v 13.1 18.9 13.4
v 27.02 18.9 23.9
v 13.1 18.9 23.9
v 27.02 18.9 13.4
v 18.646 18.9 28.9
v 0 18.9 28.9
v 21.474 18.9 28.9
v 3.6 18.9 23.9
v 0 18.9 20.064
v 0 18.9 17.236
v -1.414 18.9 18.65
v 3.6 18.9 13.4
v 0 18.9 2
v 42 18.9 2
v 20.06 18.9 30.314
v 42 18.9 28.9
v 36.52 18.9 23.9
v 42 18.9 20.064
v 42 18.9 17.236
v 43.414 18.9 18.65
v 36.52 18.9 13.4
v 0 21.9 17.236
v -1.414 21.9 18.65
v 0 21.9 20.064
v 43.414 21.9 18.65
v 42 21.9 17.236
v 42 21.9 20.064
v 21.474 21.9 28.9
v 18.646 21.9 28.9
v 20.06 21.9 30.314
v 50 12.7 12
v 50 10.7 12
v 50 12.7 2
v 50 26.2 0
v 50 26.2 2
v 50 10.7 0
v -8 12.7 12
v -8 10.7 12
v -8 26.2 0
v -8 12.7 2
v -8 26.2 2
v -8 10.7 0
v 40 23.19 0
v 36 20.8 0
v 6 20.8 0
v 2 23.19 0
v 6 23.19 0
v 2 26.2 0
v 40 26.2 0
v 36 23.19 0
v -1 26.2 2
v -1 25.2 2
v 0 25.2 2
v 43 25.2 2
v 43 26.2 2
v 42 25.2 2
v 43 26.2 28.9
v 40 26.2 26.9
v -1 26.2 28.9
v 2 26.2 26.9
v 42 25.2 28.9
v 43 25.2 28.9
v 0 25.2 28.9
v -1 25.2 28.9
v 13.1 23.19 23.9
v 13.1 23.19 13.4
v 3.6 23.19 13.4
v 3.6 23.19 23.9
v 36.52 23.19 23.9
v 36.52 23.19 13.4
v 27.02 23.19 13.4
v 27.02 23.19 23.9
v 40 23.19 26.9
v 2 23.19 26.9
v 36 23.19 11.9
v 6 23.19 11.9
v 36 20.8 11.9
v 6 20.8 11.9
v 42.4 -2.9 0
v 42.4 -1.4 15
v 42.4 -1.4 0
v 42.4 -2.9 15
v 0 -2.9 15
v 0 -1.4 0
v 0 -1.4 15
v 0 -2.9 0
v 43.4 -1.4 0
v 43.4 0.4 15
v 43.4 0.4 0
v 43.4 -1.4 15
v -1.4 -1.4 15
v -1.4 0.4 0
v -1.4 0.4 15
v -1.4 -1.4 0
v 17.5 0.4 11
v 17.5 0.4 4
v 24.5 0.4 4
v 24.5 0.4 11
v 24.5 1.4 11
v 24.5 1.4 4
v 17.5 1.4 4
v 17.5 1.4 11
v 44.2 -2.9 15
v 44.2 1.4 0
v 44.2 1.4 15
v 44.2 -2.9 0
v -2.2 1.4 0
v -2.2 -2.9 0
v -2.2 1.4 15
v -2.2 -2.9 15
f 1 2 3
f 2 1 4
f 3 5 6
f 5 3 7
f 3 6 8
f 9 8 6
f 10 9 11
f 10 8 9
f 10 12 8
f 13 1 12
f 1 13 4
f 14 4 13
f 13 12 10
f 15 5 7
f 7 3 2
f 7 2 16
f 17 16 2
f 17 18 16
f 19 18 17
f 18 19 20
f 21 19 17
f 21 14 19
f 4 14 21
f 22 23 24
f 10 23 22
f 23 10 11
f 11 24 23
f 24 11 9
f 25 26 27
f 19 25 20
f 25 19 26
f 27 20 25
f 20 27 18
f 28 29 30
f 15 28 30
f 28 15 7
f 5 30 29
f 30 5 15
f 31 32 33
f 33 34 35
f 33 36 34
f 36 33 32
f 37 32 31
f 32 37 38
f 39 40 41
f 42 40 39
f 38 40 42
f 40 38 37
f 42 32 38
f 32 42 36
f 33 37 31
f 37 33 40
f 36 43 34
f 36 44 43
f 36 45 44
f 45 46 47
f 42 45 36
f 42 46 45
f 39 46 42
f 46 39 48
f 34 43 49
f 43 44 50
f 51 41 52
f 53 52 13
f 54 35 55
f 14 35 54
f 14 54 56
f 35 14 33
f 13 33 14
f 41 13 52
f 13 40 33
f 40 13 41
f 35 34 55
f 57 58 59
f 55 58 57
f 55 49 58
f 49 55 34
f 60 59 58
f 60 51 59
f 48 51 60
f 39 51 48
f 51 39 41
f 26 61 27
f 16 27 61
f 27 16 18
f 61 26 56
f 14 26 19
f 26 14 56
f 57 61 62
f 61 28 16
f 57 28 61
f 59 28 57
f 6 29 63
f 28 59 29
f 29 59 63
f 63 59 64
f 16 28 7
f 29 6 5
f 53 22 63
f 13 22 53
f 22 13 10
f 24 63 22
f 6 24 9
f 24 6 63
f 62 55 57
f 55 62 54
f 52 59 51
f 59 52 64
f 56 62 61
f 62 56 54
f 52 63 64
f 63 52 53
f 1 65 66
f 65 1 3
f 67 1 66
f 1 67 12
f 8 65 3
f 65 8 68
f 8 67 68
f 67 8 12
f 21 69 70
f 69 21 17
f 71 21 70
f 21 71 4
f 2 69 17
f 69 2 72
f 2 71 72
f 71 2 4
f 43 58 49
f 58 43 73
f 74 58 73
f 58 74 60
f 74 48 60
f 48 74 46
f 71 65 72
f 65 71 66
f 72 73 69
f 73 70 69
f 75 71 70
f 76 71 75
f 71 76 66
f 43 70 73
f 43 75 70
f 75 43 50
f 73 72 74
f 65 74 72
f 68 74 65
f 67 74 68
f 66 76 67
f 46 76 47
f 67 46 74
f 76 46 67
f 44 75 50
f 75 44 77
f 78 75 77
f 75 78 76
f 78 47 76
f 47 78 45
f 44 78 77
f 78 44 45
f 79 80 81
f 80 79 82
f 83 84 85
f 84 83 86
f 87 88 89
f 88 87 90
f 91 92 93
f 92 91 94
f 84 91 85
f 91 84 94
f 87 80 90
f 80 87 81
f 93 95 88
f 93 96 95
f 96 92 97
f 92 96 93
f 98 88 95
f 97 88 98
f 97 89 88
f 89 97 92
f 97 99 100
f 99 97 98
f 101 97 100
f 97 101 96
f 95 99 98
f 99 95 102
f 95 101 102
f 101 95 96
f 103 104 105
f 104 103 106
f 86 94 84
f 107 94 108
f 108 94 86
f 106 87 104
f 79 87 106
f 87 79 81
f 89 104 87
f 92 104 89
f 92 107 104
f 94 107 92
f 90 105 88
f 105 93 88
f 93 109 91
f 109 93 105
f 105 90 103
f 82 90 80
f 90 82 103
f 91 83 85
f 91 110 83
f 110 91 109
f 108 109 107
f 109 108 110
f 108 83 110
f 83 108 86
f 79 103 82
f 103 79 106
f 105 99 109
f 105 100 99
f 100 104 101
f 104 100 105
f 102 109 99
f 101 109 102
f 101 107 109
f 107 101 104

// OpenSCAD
/*
* Open3DOLED is licensed under CC BY-NC-SA 4.0. To view a copy of this license, visit http://creativecommons.org/licenses/by-nc-sa/4.0/
*/

/*
*
* 3D IR Emitter Mount
*
* Version 0101a: first attempt
* Version 0102a: lots of changes
* Version 0103a: added optional spacer for ir cut filter 10x10x0.55mm https://www.aliexpress.com/item/1005002502760553.html
* Version 0104a: revised ir cut filter to be on inside with no adhesive and minimal black backing
* Version 0105a: added alignment markers for calibration assistance mode
* 
* Todo:
*  - 
* 
* Notes:
*  - 
*
*/

ovr = 0.01;

// Screen bezel to pixel height dimension
// 11 mm - LG C1 OLED and Sony XBR-48A9S Bezel Only
// 14 mm - LG C1 OLED and MMK 55MBL-EL Screen protector
// 7 mm - LG G3 OLED Bezel Only
// 9 mm - Sony X95K MiniLED
tv_top_bezel_to_pixel_wz = 11;

// Screen bezel thickness dimensions 
// 4.7 mm - LG C1 OLED Bezel Only (measured 4.4 mm)
// 6.2 mm - LG C1 OLED with felt (back and front)
// 29 mm - LG C1 OLED and MMK 55MBL-EL Screen protector
// 30 mm - LG C1 OLED and MMK 55MBL-EL Screen protector with felt
// 5.5 mm - Sony XBR-48A9S Bezel Only
// 13.5 mm - LG G3 OLED Bezel Only
// 15.0 mm - LG G3 OLED Bezel Only with felt (back and front)
// 32 mm - Sony X95K MiniLED (it has a rounded back so I've made it a little larger than what looks like 30mm any extra can be filled with spacers)
mm_r_wy = 6.2;

// Mount Ridge Ledge Height
// 10 mm - Most sets with a flat back that goes down > 10 mm from the top
// 20 mm - Sony X95K MiniLED (has a curved back for the first 10 mm)
mm_rl_wz = 10;

tv_top_wz = tv_top_bezel_to_pixel_wz+4.5; // we add 4.5 mm for optional faded board to help prevent potential burn-in

pcb_wx = 38; // measured 37.63
pcb_wz = 60; // measured 59.03
pcb_wy = 1.4;
pcb_wy_pkt = 3; // deep enough to hold the pcb board firmly but not soo deep as to hit the connector pins measured 3.4 with solder stubs sticking out
pcb_wb = 2; // plastic board thickness surrounding pcb
// pocket for solder stubs
pcb_p_px = 4;
pcb_p_wx = pcb_wx - 2*pcb_p_px;
pcb_p_wy = 2.4; // measured 4.0 minus 1.6 pcb depth
pcb_p_wz = 13; // height of pocket
pcb_p_sz = 1.5; // space between pocket and opt-101 top
// plastic back behind pcb that sticks above to screw into
pcb_b = false;
pcb_b_wy = 4; 
pcb_b_wz = pcb_wz + 2 * pcb_wb;
// plastic ridges on side to clip brace bracket onto
pcb_r = true;
pcb_r_wy = 1;
pcb_r_wx = 1;


// opt sensor (chip)
os_s_wx = 22.86; // measured 22.86 on pcbnew opt-101 center-to-center chip spacing
os_c_px_1 = 6.35; // measured 6.35 on pcbnew opt-101 left chip center from left edge
os_c_px_2 = 8.23; // measured 6.35 on pcbnew opt-101 left chip center from right edge
os_c_wx = 9.5; // measured 8 at top and 9 at bottom with solder bulge
os_c_wy = 4.3; // measured 4.5
os_c_wz = 10.5; // measured 10
os_c_pz_1 = 3; // measured 2.5 distance of opt sensor from bottom of pcb
os_c_pz_2 = pcb_wz - os_c_pz_1 - os_c_wz; // space below chip
os_c_pz_3 = (os_c_wz - 2.3) / 2; // photodiode is 2.3mm square (this is used to offset the photodiode to the edge of the screen for minimum obstruction)

// opt sensor ir cut filter mount
use_irf = false;
os_irf_s_wx = 6.0;
os_irf_s_wy = 0.9;
os_irf_s_wz = 6.0;
os_irf_s_rpx = (os_c_wx-os_irf_s_wx)/2;
os_irf_s_rpz = (os_c_wz-os_irf_s_wz)/2;
os_irf_wx = 10.5; // might need to be 11.0 depending on printer accuracy
os_irf_wy = 0.9;
os_irf_wz = 10.5; // might need to be 11.0 depending on printer accuracy
os_irf_rpx = (os_c_wx-os_irf_wx)/2;
os_irf_rpz = (os_c_wz-os_irf_wz)/2;

// mount top (ridge) (ridge ledge)

mm_wx = pcb_wx + 2*pcb_wb;
mm_wy = pcb_wy_pkt + os_c_wy + (use_irf ? os_irf_s_wy + os_irf_wy : 0);
mm_wz = tv_top_wz - os_c_pz_2 - os_c_pz_3 + pcb_wz + pcb_wb;
mm_r_px = 8;
mm_r_wx = mm_wx + 2*mm_r_px;
mm_r_wz = 2;
mm_rl_wy = 2;

// alignment markings
pcb_am = true;
pcb_am_wy = 3;
pcb_am_wxz = 2;
pcb_am3_px_off = os_c_px_1-os_c_px_2; // offset of center alignment marker to match center of opt sensors.

module 3d_player_tv_mount_main () {
  difference() {
    union() {
      translate([-mm_r_px, mm_wy+mm_r_wy, -mm_rl_wz])
      cube([mm_r_wx, mm_rl_wy, mm_rl_wz+ovr]);
      translate([-mm_r_px,0, 0])
      cube([mm_r_wx, mm_wy+mm_r_wy+mm_rl_wy, mm_r_wz]);
      translate([0,0,-mm_wz])
      cube([mm_wx, mm_wy, mm_wz+ovr]);
      if (pcb_b) {
        translate([0,0,-mm_wz])
        cube([mm_wx, pcb_b_wy, pcb_b_wz+ovr]);
      }
      if (pcb_r) {
        translate([-pcb_r_wx,0,-mm_wz])
        cube([pcb_wx+2*pcb_wb+2*pcb_r_wx, pcb_r_wy, mm_wz+ovr]);
      }
      if (pcb_am) {
        for (pxpz = [[0,os_c_pz_2+os_c_pz_3-tv_top_wz-pcb_wz+os_c_pz_1+os_c_wz/2], [pcb_wx+2*pcb_wb,os_c_pz_2+os_c_pz_3-tv_top_wz-pcb_wz+os_c_pz_1+os_c_wz/2], [(pcb_wx+2*pcb_wb+pcb_am3_px_off)/2,-mm_wz]]) {
          translate([pxpz[0],mm_wy-pcb_am_wy,pxpz[1]])
          rotate([0,45,0])
          translate([-pcb_am_wxz/2,0,-pcb_am_wxz/2])
          cube([pcb_am_wxz, pcb_am_wy, pcb_am_wxz]);
        }
      }
    }
    union() {
      echo(os_c_pz_1+os_c_wz+2);
      translate([pcb_wb, -ovr, os_c_pz_2 + os_c_pz_3 - tv_top_wz - pcb_wz])
      cube([pcb_wx,pcb_wy_pkt+2*ovr,pcb_wz]);
      translate([pcb_wb+pcb_p_px, pcb_wy_pkt-ovr, os_c_pz_2 + os_c_pz_3 - tv_top_wz - pcb_wz + os_c_pz_1+os_c_wz+pcb_p_sz ])
      cube([pcb_p_wx,pcb_p_wy+ovr,pcb_p_wz]);
      translate([0, -ovr, os_c_pz_2 + os_c_pz_3 - tv_top_wz - pcb_wz])
      union() {
        for (px = [pcb_wb+os_c_px_1-os_c_wx/2, pcb_wb+pcb_wx-os_c_px_2-os_c_wx/2]) {
          if (use_irf) {
            translate([px-(os_irf_wx-os_c_wx)/2,pcb_wy_pkt,os_c_pz_1-(os_irf_wz-os_c_wz)/2])
            cube([os_irf_wx,os_c_wy+os_irf_wy+2*ovr,os_irf_wz]); // opt101 hole
            translate([px+os_irf_s_rpx,pcb_wy_pkt+os_c_wy+os_irf_wy,os_c_pz_1+os_irf_s_rpz])
            cube([os_irf_s_wx,os_irf_s_wy+2*ovr,os_irf_s_wz]); // opt101 hole above chip
          }
          else {
            translate([px,pcb_wy_pkt,os_c_pz_1])
            cube([os_c_wx,os_c_wy+2*ovr,os_c_wz]); // opt101 hole
          }
        }
      }
    }
  }
}

mb_wc = 1.0; // width of clip needs to bend slightly
mb_tf = 0.8; // tension factor on ridges
mb_wx = mm_wx + 2 * mb_tf * pcb_r_wx + 2 * mb_wc;
mb_wz = 13+pcb_wb; // measured 11.0
mb_px = - mb_tf * pcb_r_wx - mb_wc;
mb_c_wy = 3.5; // clip depth
mb_c_wt = 0.4; // tolerances on clip to mating side
mb_c_wt_s = 0.2; // tolerances on clip gripping part
mb_rb_wx = 7; // reset button
mb_rb_wz = 7; // reset button
mb_rb_pz = 7.5; // measured 6.5

module 3d_player_tv_mount_bracket () {
  difference() {
    union() {
      translate([mb_px-mb_c_wt,-mb_wc-mb_c_wt,-mm_wz+pcb_wb])
      cube([mb_wx+2*mb_c_wt, mb_c_wy+2*mb_c_wt, mb_wz]);
    }
    union() {
      translate([0,0,-mm_wz-ovr])
      cube([mm_wx+2*mb_c_wt_s, mm_wy, mm_wz+2*ovr]);
      translate([-pcb_r_wx-mb_c_wt,-mb_c_wt,-mm_wz-ovr])
      cube([pcb_wx+2*pcb_wb+2*pcb_r_wx+2*mb_c_wt, pcb_r_wy+2*mb_c_wt, mm_wz+2*ovr]);
      translate([pcb_wx/2+pcb_wb-mb_rb_wx/2, -mb_wc-mb_c_wt-ovr, -mm_wz+mb_rb_pz-mb_rb_wz/2+pcb_wb])
      cube([mb_rb_wx, mb_wc+2*ovr, mb_rb_wz]);
    }
  }
}


translate([0, mm_r_wy+20, mm_r_wz])
rotate([180,0,0])
3d_player_tv_mount_main();
translate([0, 0, mb_wz-mm_wz+pcb_wb])
rotate([180,0,0])
3d_player_tv_mount_bracket();
